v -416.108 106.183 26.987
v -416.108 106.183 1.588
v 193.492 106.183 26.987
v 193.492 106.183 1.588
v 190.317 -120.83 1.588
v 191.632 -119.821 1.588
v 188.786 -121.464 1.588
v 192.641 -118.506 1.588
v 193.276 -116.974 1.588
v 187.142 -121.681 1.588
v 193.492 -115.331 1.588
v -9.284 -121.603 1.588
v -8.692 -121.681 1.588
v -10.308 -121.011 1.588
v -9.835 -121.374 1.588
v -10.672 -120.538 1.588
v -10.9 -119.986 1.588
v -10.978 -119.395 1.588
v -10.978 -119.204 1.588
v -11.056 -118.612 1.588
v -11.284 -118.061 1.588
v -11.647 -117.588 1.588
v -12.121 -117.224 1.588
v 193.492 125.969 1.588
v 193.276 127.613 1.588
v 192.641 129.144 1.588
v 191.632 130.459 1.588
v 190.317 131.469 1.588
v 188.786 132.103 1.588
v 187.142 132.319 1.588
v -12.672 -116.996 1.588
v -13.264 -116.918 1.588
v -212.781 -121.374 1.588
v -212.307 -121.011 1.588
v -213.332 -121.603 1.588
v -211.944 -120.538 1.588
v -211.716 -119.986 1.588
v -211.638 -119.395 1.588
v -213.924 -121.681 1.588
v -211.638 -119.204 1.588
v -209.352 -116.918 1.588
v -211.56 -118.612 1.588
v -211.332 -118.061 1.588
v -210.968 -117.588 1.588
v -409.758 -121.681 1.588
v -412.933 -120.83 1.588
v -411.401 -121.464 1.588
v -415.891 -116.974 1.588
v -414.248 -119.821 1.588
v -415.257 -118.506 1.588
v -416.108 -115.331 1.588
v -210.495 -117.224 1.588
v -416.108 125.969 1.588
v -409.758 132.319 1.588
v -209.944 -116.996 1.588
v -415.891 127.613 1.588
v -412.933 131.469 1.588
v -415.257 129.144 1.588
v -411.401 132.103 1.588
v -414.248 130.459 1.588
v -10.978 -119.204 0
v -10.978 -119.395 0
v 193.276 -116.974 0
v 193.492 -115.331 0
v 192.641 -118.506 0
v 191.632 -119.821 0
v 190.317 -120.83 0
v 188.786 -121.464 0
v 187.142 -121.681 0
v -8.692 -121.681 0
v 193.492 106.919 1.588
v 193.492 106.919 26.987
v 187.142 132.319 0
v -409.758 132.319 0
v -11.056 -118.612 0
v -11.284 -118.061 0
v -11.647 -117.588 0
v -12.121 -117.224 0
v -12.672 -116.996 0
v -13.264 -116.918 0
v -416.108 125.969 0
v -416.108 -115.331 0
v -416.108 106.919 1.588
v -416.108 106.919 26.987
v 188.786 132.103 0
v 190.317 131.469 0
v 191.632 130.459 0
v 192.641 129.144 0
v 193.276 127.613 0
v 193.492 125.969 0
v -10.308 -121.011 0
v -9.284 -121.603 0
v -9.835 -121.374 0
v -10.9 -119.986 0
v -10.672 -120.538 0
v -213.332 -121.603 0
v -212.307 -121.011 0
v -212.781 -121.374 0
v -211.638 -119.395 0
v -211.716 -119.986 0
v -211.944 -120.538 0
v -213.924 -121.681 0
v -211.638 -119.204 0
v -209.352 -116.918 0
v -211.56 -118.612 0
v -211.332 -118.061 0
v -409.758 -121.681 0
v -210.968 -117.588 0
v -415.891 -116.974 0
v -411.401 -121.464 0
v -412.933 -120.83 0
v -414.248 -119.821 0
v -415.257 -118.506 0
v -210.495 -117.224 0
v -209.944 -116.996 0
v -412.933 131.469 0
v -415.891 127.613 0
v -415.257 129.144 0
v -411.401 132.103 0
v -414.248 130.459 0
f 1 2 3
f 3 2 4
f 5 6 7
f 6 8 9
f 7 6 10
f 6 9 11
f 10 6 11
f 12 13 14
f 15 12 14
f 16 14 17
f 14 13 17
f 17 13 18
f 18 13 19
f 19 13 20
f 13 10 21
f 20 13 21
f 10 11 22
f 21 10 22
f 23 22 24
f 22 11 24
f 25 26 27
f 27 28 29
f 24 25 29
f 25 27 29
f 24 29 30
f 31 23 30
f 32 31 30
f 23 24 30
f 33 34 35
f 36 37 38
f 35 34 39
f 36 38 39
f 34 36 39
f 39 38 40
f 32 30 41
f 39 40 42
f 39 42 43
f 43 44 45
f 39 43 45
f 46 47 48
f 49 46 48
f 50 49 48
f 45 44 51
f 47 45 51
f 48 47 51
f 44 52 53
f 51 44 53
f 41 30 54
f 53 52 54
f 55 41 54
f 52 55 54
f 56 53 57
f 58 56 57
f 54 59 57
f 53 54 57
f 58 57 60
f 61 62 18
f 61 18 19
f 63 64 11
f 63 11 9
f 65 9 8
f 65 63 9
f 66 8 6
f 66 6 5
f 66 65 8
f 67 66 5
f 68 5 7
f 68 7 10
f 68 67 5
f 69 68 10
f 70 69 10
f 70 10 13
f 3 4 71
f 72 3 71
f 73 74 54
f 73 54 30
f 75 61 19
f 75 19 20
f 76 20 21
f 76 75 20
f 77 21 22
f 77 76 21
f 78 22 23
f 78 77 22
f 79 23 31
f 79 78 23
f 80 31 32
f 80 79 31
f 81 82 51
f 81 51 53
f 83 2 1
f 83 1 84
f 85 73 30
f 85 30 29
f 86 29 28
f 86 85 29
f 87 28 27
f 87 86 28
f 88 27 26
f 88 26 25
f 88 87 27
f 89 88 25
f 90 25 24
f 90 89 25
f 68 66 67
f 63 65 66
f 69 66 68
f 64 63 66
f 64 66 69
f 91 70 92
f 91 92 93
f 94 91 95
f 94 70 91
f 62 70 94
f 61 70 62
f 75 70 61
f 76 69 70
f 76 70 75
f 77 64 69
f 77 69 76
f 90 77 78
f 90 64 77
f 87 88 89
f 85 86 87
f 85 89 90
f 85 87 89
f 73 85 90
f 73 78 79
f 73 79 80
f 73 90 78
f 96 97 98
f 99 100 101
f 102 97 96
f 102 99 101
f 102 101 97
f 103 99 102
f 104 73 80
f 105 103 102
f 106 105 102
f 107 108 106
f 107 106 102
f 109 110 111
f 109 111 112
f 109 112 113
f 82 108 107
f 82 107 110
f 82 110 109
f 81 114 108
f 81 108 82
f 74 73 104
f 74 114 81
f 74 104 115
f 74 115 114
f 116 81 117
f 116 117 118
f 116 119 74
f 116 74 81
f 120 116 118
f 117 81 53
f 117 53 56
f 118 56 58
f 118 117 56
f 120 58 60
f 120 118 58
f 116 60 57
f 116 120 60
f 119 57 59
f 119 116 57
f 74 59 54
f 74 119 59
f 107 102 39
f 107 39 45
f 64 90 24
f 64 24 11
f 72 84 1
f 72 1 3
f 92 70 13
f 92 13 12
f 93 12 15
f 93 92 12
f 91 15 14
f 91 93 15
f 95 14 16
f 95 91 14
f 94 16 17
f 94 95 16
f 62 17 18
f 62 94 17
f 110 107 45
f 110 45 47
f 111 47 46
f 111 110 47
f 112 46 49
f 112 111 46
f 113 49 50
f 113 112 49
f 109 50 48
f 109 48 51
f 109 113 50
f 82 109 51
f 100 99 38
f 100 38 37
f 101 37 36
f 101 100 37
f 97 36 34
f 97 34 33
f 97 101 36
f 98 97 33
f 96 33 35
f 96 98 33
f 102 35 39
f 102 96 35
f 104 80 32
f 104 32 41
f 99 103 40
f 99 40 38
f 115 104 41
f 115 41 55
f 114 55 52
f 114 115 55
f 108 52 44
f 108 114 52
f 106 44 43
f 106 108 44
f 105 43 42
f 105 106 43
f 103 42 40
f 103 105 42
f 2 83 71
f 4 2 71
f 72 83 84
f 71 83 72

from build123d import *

# Parameters (mm, degrees)
BOSS_EXTRUDE1_DEPTH = 1.5875
SKETCH4_W           = 609.6
SKETCH4_H           = 0.7366
BASE_FLANGE1_DEPTH  = 25.4


# Sheet-metal steps are written as plain solids
with BuildPart() as part:
    # Sketch1 → Boss-Extrude1 (new body)
    with BuildSketch(Plane.XY):
        with BuildLine():
            Line((-409.757853403, 132.319371728), (187.142146597, 132.319371728))
            ThreePointArc((187.142146597, 132.319371728), (191.632274657, 130.459499788), (193.492146597, 125.969371728))
            Line((193.492146597, 125.969371728), (193.492146597, -115.330628272))
            ThreePointArc((193.492146597, -115.330628272), (191.632274657, -119.820756333), (187.142146597, -121.680628272))
            Line((187.142146597, -121.680628272), (-8.691853403, -121.680628272))
            ThreePointArc((-8.691853403, -121.680628272), (-10.308299505, -121.011074374), (-10.977853403, -119.394628272))
            Line((-10.977853403, -119.394628272), (-10.977853403, -119.204128272))
            ThreePointArc((-10.977853403, -119.204128272), (-11.647407301, -117.58768217), (-13.263853403, -116.918128272))
            Line((-13.263853403, -116.918128272), (-209.351853403, -116.918128272))
            ThreePointArc((-209.351853403, -116.918128272), (-210.968299505, -117.58768217), (-211.637853403, -119.204128272))
            Line((-211.637853403, -119.204128272), (-211.637853403, -119.394628272))
            ThreePointArc((-211.637853403, -119.394628272), (-212.307407301, -121.011074374), (-213.923853403, -121.680628272))
            Line((-213.923853403, -121.680628272), (-409.757853403, -121.680628272))
            ThreePointArc((-409.757853403, -121.680628272), (-414.247981464, -119.820756333), (-416.107853403, -115.330628272))
            Line((-416.107853403, -115.330628272), (-416.107853403, 125.969371728))
            ThreePointArc((-416.107853403, 125.969371728), (-414.247981464, 130.459499788), (-409.757853403, 132.319371728))
        make_face()
    extrude(amount=BOSS_EXTRUDE1_DEPTH)


with BuildPart() as body_2:
    # Sketch4 → Base-Flange1 (new body)
    with BuildSketch(Plane.XY.offset(1.5875)):
        with Locations((-111.307853403, 106.551071728)):
            Rectangle(SKETCH4_W, SKETCH4_H)
    extrude(amount=BASE_FLANGE1_DEPTH)


solid = Compound([part.part, body_2.part])
